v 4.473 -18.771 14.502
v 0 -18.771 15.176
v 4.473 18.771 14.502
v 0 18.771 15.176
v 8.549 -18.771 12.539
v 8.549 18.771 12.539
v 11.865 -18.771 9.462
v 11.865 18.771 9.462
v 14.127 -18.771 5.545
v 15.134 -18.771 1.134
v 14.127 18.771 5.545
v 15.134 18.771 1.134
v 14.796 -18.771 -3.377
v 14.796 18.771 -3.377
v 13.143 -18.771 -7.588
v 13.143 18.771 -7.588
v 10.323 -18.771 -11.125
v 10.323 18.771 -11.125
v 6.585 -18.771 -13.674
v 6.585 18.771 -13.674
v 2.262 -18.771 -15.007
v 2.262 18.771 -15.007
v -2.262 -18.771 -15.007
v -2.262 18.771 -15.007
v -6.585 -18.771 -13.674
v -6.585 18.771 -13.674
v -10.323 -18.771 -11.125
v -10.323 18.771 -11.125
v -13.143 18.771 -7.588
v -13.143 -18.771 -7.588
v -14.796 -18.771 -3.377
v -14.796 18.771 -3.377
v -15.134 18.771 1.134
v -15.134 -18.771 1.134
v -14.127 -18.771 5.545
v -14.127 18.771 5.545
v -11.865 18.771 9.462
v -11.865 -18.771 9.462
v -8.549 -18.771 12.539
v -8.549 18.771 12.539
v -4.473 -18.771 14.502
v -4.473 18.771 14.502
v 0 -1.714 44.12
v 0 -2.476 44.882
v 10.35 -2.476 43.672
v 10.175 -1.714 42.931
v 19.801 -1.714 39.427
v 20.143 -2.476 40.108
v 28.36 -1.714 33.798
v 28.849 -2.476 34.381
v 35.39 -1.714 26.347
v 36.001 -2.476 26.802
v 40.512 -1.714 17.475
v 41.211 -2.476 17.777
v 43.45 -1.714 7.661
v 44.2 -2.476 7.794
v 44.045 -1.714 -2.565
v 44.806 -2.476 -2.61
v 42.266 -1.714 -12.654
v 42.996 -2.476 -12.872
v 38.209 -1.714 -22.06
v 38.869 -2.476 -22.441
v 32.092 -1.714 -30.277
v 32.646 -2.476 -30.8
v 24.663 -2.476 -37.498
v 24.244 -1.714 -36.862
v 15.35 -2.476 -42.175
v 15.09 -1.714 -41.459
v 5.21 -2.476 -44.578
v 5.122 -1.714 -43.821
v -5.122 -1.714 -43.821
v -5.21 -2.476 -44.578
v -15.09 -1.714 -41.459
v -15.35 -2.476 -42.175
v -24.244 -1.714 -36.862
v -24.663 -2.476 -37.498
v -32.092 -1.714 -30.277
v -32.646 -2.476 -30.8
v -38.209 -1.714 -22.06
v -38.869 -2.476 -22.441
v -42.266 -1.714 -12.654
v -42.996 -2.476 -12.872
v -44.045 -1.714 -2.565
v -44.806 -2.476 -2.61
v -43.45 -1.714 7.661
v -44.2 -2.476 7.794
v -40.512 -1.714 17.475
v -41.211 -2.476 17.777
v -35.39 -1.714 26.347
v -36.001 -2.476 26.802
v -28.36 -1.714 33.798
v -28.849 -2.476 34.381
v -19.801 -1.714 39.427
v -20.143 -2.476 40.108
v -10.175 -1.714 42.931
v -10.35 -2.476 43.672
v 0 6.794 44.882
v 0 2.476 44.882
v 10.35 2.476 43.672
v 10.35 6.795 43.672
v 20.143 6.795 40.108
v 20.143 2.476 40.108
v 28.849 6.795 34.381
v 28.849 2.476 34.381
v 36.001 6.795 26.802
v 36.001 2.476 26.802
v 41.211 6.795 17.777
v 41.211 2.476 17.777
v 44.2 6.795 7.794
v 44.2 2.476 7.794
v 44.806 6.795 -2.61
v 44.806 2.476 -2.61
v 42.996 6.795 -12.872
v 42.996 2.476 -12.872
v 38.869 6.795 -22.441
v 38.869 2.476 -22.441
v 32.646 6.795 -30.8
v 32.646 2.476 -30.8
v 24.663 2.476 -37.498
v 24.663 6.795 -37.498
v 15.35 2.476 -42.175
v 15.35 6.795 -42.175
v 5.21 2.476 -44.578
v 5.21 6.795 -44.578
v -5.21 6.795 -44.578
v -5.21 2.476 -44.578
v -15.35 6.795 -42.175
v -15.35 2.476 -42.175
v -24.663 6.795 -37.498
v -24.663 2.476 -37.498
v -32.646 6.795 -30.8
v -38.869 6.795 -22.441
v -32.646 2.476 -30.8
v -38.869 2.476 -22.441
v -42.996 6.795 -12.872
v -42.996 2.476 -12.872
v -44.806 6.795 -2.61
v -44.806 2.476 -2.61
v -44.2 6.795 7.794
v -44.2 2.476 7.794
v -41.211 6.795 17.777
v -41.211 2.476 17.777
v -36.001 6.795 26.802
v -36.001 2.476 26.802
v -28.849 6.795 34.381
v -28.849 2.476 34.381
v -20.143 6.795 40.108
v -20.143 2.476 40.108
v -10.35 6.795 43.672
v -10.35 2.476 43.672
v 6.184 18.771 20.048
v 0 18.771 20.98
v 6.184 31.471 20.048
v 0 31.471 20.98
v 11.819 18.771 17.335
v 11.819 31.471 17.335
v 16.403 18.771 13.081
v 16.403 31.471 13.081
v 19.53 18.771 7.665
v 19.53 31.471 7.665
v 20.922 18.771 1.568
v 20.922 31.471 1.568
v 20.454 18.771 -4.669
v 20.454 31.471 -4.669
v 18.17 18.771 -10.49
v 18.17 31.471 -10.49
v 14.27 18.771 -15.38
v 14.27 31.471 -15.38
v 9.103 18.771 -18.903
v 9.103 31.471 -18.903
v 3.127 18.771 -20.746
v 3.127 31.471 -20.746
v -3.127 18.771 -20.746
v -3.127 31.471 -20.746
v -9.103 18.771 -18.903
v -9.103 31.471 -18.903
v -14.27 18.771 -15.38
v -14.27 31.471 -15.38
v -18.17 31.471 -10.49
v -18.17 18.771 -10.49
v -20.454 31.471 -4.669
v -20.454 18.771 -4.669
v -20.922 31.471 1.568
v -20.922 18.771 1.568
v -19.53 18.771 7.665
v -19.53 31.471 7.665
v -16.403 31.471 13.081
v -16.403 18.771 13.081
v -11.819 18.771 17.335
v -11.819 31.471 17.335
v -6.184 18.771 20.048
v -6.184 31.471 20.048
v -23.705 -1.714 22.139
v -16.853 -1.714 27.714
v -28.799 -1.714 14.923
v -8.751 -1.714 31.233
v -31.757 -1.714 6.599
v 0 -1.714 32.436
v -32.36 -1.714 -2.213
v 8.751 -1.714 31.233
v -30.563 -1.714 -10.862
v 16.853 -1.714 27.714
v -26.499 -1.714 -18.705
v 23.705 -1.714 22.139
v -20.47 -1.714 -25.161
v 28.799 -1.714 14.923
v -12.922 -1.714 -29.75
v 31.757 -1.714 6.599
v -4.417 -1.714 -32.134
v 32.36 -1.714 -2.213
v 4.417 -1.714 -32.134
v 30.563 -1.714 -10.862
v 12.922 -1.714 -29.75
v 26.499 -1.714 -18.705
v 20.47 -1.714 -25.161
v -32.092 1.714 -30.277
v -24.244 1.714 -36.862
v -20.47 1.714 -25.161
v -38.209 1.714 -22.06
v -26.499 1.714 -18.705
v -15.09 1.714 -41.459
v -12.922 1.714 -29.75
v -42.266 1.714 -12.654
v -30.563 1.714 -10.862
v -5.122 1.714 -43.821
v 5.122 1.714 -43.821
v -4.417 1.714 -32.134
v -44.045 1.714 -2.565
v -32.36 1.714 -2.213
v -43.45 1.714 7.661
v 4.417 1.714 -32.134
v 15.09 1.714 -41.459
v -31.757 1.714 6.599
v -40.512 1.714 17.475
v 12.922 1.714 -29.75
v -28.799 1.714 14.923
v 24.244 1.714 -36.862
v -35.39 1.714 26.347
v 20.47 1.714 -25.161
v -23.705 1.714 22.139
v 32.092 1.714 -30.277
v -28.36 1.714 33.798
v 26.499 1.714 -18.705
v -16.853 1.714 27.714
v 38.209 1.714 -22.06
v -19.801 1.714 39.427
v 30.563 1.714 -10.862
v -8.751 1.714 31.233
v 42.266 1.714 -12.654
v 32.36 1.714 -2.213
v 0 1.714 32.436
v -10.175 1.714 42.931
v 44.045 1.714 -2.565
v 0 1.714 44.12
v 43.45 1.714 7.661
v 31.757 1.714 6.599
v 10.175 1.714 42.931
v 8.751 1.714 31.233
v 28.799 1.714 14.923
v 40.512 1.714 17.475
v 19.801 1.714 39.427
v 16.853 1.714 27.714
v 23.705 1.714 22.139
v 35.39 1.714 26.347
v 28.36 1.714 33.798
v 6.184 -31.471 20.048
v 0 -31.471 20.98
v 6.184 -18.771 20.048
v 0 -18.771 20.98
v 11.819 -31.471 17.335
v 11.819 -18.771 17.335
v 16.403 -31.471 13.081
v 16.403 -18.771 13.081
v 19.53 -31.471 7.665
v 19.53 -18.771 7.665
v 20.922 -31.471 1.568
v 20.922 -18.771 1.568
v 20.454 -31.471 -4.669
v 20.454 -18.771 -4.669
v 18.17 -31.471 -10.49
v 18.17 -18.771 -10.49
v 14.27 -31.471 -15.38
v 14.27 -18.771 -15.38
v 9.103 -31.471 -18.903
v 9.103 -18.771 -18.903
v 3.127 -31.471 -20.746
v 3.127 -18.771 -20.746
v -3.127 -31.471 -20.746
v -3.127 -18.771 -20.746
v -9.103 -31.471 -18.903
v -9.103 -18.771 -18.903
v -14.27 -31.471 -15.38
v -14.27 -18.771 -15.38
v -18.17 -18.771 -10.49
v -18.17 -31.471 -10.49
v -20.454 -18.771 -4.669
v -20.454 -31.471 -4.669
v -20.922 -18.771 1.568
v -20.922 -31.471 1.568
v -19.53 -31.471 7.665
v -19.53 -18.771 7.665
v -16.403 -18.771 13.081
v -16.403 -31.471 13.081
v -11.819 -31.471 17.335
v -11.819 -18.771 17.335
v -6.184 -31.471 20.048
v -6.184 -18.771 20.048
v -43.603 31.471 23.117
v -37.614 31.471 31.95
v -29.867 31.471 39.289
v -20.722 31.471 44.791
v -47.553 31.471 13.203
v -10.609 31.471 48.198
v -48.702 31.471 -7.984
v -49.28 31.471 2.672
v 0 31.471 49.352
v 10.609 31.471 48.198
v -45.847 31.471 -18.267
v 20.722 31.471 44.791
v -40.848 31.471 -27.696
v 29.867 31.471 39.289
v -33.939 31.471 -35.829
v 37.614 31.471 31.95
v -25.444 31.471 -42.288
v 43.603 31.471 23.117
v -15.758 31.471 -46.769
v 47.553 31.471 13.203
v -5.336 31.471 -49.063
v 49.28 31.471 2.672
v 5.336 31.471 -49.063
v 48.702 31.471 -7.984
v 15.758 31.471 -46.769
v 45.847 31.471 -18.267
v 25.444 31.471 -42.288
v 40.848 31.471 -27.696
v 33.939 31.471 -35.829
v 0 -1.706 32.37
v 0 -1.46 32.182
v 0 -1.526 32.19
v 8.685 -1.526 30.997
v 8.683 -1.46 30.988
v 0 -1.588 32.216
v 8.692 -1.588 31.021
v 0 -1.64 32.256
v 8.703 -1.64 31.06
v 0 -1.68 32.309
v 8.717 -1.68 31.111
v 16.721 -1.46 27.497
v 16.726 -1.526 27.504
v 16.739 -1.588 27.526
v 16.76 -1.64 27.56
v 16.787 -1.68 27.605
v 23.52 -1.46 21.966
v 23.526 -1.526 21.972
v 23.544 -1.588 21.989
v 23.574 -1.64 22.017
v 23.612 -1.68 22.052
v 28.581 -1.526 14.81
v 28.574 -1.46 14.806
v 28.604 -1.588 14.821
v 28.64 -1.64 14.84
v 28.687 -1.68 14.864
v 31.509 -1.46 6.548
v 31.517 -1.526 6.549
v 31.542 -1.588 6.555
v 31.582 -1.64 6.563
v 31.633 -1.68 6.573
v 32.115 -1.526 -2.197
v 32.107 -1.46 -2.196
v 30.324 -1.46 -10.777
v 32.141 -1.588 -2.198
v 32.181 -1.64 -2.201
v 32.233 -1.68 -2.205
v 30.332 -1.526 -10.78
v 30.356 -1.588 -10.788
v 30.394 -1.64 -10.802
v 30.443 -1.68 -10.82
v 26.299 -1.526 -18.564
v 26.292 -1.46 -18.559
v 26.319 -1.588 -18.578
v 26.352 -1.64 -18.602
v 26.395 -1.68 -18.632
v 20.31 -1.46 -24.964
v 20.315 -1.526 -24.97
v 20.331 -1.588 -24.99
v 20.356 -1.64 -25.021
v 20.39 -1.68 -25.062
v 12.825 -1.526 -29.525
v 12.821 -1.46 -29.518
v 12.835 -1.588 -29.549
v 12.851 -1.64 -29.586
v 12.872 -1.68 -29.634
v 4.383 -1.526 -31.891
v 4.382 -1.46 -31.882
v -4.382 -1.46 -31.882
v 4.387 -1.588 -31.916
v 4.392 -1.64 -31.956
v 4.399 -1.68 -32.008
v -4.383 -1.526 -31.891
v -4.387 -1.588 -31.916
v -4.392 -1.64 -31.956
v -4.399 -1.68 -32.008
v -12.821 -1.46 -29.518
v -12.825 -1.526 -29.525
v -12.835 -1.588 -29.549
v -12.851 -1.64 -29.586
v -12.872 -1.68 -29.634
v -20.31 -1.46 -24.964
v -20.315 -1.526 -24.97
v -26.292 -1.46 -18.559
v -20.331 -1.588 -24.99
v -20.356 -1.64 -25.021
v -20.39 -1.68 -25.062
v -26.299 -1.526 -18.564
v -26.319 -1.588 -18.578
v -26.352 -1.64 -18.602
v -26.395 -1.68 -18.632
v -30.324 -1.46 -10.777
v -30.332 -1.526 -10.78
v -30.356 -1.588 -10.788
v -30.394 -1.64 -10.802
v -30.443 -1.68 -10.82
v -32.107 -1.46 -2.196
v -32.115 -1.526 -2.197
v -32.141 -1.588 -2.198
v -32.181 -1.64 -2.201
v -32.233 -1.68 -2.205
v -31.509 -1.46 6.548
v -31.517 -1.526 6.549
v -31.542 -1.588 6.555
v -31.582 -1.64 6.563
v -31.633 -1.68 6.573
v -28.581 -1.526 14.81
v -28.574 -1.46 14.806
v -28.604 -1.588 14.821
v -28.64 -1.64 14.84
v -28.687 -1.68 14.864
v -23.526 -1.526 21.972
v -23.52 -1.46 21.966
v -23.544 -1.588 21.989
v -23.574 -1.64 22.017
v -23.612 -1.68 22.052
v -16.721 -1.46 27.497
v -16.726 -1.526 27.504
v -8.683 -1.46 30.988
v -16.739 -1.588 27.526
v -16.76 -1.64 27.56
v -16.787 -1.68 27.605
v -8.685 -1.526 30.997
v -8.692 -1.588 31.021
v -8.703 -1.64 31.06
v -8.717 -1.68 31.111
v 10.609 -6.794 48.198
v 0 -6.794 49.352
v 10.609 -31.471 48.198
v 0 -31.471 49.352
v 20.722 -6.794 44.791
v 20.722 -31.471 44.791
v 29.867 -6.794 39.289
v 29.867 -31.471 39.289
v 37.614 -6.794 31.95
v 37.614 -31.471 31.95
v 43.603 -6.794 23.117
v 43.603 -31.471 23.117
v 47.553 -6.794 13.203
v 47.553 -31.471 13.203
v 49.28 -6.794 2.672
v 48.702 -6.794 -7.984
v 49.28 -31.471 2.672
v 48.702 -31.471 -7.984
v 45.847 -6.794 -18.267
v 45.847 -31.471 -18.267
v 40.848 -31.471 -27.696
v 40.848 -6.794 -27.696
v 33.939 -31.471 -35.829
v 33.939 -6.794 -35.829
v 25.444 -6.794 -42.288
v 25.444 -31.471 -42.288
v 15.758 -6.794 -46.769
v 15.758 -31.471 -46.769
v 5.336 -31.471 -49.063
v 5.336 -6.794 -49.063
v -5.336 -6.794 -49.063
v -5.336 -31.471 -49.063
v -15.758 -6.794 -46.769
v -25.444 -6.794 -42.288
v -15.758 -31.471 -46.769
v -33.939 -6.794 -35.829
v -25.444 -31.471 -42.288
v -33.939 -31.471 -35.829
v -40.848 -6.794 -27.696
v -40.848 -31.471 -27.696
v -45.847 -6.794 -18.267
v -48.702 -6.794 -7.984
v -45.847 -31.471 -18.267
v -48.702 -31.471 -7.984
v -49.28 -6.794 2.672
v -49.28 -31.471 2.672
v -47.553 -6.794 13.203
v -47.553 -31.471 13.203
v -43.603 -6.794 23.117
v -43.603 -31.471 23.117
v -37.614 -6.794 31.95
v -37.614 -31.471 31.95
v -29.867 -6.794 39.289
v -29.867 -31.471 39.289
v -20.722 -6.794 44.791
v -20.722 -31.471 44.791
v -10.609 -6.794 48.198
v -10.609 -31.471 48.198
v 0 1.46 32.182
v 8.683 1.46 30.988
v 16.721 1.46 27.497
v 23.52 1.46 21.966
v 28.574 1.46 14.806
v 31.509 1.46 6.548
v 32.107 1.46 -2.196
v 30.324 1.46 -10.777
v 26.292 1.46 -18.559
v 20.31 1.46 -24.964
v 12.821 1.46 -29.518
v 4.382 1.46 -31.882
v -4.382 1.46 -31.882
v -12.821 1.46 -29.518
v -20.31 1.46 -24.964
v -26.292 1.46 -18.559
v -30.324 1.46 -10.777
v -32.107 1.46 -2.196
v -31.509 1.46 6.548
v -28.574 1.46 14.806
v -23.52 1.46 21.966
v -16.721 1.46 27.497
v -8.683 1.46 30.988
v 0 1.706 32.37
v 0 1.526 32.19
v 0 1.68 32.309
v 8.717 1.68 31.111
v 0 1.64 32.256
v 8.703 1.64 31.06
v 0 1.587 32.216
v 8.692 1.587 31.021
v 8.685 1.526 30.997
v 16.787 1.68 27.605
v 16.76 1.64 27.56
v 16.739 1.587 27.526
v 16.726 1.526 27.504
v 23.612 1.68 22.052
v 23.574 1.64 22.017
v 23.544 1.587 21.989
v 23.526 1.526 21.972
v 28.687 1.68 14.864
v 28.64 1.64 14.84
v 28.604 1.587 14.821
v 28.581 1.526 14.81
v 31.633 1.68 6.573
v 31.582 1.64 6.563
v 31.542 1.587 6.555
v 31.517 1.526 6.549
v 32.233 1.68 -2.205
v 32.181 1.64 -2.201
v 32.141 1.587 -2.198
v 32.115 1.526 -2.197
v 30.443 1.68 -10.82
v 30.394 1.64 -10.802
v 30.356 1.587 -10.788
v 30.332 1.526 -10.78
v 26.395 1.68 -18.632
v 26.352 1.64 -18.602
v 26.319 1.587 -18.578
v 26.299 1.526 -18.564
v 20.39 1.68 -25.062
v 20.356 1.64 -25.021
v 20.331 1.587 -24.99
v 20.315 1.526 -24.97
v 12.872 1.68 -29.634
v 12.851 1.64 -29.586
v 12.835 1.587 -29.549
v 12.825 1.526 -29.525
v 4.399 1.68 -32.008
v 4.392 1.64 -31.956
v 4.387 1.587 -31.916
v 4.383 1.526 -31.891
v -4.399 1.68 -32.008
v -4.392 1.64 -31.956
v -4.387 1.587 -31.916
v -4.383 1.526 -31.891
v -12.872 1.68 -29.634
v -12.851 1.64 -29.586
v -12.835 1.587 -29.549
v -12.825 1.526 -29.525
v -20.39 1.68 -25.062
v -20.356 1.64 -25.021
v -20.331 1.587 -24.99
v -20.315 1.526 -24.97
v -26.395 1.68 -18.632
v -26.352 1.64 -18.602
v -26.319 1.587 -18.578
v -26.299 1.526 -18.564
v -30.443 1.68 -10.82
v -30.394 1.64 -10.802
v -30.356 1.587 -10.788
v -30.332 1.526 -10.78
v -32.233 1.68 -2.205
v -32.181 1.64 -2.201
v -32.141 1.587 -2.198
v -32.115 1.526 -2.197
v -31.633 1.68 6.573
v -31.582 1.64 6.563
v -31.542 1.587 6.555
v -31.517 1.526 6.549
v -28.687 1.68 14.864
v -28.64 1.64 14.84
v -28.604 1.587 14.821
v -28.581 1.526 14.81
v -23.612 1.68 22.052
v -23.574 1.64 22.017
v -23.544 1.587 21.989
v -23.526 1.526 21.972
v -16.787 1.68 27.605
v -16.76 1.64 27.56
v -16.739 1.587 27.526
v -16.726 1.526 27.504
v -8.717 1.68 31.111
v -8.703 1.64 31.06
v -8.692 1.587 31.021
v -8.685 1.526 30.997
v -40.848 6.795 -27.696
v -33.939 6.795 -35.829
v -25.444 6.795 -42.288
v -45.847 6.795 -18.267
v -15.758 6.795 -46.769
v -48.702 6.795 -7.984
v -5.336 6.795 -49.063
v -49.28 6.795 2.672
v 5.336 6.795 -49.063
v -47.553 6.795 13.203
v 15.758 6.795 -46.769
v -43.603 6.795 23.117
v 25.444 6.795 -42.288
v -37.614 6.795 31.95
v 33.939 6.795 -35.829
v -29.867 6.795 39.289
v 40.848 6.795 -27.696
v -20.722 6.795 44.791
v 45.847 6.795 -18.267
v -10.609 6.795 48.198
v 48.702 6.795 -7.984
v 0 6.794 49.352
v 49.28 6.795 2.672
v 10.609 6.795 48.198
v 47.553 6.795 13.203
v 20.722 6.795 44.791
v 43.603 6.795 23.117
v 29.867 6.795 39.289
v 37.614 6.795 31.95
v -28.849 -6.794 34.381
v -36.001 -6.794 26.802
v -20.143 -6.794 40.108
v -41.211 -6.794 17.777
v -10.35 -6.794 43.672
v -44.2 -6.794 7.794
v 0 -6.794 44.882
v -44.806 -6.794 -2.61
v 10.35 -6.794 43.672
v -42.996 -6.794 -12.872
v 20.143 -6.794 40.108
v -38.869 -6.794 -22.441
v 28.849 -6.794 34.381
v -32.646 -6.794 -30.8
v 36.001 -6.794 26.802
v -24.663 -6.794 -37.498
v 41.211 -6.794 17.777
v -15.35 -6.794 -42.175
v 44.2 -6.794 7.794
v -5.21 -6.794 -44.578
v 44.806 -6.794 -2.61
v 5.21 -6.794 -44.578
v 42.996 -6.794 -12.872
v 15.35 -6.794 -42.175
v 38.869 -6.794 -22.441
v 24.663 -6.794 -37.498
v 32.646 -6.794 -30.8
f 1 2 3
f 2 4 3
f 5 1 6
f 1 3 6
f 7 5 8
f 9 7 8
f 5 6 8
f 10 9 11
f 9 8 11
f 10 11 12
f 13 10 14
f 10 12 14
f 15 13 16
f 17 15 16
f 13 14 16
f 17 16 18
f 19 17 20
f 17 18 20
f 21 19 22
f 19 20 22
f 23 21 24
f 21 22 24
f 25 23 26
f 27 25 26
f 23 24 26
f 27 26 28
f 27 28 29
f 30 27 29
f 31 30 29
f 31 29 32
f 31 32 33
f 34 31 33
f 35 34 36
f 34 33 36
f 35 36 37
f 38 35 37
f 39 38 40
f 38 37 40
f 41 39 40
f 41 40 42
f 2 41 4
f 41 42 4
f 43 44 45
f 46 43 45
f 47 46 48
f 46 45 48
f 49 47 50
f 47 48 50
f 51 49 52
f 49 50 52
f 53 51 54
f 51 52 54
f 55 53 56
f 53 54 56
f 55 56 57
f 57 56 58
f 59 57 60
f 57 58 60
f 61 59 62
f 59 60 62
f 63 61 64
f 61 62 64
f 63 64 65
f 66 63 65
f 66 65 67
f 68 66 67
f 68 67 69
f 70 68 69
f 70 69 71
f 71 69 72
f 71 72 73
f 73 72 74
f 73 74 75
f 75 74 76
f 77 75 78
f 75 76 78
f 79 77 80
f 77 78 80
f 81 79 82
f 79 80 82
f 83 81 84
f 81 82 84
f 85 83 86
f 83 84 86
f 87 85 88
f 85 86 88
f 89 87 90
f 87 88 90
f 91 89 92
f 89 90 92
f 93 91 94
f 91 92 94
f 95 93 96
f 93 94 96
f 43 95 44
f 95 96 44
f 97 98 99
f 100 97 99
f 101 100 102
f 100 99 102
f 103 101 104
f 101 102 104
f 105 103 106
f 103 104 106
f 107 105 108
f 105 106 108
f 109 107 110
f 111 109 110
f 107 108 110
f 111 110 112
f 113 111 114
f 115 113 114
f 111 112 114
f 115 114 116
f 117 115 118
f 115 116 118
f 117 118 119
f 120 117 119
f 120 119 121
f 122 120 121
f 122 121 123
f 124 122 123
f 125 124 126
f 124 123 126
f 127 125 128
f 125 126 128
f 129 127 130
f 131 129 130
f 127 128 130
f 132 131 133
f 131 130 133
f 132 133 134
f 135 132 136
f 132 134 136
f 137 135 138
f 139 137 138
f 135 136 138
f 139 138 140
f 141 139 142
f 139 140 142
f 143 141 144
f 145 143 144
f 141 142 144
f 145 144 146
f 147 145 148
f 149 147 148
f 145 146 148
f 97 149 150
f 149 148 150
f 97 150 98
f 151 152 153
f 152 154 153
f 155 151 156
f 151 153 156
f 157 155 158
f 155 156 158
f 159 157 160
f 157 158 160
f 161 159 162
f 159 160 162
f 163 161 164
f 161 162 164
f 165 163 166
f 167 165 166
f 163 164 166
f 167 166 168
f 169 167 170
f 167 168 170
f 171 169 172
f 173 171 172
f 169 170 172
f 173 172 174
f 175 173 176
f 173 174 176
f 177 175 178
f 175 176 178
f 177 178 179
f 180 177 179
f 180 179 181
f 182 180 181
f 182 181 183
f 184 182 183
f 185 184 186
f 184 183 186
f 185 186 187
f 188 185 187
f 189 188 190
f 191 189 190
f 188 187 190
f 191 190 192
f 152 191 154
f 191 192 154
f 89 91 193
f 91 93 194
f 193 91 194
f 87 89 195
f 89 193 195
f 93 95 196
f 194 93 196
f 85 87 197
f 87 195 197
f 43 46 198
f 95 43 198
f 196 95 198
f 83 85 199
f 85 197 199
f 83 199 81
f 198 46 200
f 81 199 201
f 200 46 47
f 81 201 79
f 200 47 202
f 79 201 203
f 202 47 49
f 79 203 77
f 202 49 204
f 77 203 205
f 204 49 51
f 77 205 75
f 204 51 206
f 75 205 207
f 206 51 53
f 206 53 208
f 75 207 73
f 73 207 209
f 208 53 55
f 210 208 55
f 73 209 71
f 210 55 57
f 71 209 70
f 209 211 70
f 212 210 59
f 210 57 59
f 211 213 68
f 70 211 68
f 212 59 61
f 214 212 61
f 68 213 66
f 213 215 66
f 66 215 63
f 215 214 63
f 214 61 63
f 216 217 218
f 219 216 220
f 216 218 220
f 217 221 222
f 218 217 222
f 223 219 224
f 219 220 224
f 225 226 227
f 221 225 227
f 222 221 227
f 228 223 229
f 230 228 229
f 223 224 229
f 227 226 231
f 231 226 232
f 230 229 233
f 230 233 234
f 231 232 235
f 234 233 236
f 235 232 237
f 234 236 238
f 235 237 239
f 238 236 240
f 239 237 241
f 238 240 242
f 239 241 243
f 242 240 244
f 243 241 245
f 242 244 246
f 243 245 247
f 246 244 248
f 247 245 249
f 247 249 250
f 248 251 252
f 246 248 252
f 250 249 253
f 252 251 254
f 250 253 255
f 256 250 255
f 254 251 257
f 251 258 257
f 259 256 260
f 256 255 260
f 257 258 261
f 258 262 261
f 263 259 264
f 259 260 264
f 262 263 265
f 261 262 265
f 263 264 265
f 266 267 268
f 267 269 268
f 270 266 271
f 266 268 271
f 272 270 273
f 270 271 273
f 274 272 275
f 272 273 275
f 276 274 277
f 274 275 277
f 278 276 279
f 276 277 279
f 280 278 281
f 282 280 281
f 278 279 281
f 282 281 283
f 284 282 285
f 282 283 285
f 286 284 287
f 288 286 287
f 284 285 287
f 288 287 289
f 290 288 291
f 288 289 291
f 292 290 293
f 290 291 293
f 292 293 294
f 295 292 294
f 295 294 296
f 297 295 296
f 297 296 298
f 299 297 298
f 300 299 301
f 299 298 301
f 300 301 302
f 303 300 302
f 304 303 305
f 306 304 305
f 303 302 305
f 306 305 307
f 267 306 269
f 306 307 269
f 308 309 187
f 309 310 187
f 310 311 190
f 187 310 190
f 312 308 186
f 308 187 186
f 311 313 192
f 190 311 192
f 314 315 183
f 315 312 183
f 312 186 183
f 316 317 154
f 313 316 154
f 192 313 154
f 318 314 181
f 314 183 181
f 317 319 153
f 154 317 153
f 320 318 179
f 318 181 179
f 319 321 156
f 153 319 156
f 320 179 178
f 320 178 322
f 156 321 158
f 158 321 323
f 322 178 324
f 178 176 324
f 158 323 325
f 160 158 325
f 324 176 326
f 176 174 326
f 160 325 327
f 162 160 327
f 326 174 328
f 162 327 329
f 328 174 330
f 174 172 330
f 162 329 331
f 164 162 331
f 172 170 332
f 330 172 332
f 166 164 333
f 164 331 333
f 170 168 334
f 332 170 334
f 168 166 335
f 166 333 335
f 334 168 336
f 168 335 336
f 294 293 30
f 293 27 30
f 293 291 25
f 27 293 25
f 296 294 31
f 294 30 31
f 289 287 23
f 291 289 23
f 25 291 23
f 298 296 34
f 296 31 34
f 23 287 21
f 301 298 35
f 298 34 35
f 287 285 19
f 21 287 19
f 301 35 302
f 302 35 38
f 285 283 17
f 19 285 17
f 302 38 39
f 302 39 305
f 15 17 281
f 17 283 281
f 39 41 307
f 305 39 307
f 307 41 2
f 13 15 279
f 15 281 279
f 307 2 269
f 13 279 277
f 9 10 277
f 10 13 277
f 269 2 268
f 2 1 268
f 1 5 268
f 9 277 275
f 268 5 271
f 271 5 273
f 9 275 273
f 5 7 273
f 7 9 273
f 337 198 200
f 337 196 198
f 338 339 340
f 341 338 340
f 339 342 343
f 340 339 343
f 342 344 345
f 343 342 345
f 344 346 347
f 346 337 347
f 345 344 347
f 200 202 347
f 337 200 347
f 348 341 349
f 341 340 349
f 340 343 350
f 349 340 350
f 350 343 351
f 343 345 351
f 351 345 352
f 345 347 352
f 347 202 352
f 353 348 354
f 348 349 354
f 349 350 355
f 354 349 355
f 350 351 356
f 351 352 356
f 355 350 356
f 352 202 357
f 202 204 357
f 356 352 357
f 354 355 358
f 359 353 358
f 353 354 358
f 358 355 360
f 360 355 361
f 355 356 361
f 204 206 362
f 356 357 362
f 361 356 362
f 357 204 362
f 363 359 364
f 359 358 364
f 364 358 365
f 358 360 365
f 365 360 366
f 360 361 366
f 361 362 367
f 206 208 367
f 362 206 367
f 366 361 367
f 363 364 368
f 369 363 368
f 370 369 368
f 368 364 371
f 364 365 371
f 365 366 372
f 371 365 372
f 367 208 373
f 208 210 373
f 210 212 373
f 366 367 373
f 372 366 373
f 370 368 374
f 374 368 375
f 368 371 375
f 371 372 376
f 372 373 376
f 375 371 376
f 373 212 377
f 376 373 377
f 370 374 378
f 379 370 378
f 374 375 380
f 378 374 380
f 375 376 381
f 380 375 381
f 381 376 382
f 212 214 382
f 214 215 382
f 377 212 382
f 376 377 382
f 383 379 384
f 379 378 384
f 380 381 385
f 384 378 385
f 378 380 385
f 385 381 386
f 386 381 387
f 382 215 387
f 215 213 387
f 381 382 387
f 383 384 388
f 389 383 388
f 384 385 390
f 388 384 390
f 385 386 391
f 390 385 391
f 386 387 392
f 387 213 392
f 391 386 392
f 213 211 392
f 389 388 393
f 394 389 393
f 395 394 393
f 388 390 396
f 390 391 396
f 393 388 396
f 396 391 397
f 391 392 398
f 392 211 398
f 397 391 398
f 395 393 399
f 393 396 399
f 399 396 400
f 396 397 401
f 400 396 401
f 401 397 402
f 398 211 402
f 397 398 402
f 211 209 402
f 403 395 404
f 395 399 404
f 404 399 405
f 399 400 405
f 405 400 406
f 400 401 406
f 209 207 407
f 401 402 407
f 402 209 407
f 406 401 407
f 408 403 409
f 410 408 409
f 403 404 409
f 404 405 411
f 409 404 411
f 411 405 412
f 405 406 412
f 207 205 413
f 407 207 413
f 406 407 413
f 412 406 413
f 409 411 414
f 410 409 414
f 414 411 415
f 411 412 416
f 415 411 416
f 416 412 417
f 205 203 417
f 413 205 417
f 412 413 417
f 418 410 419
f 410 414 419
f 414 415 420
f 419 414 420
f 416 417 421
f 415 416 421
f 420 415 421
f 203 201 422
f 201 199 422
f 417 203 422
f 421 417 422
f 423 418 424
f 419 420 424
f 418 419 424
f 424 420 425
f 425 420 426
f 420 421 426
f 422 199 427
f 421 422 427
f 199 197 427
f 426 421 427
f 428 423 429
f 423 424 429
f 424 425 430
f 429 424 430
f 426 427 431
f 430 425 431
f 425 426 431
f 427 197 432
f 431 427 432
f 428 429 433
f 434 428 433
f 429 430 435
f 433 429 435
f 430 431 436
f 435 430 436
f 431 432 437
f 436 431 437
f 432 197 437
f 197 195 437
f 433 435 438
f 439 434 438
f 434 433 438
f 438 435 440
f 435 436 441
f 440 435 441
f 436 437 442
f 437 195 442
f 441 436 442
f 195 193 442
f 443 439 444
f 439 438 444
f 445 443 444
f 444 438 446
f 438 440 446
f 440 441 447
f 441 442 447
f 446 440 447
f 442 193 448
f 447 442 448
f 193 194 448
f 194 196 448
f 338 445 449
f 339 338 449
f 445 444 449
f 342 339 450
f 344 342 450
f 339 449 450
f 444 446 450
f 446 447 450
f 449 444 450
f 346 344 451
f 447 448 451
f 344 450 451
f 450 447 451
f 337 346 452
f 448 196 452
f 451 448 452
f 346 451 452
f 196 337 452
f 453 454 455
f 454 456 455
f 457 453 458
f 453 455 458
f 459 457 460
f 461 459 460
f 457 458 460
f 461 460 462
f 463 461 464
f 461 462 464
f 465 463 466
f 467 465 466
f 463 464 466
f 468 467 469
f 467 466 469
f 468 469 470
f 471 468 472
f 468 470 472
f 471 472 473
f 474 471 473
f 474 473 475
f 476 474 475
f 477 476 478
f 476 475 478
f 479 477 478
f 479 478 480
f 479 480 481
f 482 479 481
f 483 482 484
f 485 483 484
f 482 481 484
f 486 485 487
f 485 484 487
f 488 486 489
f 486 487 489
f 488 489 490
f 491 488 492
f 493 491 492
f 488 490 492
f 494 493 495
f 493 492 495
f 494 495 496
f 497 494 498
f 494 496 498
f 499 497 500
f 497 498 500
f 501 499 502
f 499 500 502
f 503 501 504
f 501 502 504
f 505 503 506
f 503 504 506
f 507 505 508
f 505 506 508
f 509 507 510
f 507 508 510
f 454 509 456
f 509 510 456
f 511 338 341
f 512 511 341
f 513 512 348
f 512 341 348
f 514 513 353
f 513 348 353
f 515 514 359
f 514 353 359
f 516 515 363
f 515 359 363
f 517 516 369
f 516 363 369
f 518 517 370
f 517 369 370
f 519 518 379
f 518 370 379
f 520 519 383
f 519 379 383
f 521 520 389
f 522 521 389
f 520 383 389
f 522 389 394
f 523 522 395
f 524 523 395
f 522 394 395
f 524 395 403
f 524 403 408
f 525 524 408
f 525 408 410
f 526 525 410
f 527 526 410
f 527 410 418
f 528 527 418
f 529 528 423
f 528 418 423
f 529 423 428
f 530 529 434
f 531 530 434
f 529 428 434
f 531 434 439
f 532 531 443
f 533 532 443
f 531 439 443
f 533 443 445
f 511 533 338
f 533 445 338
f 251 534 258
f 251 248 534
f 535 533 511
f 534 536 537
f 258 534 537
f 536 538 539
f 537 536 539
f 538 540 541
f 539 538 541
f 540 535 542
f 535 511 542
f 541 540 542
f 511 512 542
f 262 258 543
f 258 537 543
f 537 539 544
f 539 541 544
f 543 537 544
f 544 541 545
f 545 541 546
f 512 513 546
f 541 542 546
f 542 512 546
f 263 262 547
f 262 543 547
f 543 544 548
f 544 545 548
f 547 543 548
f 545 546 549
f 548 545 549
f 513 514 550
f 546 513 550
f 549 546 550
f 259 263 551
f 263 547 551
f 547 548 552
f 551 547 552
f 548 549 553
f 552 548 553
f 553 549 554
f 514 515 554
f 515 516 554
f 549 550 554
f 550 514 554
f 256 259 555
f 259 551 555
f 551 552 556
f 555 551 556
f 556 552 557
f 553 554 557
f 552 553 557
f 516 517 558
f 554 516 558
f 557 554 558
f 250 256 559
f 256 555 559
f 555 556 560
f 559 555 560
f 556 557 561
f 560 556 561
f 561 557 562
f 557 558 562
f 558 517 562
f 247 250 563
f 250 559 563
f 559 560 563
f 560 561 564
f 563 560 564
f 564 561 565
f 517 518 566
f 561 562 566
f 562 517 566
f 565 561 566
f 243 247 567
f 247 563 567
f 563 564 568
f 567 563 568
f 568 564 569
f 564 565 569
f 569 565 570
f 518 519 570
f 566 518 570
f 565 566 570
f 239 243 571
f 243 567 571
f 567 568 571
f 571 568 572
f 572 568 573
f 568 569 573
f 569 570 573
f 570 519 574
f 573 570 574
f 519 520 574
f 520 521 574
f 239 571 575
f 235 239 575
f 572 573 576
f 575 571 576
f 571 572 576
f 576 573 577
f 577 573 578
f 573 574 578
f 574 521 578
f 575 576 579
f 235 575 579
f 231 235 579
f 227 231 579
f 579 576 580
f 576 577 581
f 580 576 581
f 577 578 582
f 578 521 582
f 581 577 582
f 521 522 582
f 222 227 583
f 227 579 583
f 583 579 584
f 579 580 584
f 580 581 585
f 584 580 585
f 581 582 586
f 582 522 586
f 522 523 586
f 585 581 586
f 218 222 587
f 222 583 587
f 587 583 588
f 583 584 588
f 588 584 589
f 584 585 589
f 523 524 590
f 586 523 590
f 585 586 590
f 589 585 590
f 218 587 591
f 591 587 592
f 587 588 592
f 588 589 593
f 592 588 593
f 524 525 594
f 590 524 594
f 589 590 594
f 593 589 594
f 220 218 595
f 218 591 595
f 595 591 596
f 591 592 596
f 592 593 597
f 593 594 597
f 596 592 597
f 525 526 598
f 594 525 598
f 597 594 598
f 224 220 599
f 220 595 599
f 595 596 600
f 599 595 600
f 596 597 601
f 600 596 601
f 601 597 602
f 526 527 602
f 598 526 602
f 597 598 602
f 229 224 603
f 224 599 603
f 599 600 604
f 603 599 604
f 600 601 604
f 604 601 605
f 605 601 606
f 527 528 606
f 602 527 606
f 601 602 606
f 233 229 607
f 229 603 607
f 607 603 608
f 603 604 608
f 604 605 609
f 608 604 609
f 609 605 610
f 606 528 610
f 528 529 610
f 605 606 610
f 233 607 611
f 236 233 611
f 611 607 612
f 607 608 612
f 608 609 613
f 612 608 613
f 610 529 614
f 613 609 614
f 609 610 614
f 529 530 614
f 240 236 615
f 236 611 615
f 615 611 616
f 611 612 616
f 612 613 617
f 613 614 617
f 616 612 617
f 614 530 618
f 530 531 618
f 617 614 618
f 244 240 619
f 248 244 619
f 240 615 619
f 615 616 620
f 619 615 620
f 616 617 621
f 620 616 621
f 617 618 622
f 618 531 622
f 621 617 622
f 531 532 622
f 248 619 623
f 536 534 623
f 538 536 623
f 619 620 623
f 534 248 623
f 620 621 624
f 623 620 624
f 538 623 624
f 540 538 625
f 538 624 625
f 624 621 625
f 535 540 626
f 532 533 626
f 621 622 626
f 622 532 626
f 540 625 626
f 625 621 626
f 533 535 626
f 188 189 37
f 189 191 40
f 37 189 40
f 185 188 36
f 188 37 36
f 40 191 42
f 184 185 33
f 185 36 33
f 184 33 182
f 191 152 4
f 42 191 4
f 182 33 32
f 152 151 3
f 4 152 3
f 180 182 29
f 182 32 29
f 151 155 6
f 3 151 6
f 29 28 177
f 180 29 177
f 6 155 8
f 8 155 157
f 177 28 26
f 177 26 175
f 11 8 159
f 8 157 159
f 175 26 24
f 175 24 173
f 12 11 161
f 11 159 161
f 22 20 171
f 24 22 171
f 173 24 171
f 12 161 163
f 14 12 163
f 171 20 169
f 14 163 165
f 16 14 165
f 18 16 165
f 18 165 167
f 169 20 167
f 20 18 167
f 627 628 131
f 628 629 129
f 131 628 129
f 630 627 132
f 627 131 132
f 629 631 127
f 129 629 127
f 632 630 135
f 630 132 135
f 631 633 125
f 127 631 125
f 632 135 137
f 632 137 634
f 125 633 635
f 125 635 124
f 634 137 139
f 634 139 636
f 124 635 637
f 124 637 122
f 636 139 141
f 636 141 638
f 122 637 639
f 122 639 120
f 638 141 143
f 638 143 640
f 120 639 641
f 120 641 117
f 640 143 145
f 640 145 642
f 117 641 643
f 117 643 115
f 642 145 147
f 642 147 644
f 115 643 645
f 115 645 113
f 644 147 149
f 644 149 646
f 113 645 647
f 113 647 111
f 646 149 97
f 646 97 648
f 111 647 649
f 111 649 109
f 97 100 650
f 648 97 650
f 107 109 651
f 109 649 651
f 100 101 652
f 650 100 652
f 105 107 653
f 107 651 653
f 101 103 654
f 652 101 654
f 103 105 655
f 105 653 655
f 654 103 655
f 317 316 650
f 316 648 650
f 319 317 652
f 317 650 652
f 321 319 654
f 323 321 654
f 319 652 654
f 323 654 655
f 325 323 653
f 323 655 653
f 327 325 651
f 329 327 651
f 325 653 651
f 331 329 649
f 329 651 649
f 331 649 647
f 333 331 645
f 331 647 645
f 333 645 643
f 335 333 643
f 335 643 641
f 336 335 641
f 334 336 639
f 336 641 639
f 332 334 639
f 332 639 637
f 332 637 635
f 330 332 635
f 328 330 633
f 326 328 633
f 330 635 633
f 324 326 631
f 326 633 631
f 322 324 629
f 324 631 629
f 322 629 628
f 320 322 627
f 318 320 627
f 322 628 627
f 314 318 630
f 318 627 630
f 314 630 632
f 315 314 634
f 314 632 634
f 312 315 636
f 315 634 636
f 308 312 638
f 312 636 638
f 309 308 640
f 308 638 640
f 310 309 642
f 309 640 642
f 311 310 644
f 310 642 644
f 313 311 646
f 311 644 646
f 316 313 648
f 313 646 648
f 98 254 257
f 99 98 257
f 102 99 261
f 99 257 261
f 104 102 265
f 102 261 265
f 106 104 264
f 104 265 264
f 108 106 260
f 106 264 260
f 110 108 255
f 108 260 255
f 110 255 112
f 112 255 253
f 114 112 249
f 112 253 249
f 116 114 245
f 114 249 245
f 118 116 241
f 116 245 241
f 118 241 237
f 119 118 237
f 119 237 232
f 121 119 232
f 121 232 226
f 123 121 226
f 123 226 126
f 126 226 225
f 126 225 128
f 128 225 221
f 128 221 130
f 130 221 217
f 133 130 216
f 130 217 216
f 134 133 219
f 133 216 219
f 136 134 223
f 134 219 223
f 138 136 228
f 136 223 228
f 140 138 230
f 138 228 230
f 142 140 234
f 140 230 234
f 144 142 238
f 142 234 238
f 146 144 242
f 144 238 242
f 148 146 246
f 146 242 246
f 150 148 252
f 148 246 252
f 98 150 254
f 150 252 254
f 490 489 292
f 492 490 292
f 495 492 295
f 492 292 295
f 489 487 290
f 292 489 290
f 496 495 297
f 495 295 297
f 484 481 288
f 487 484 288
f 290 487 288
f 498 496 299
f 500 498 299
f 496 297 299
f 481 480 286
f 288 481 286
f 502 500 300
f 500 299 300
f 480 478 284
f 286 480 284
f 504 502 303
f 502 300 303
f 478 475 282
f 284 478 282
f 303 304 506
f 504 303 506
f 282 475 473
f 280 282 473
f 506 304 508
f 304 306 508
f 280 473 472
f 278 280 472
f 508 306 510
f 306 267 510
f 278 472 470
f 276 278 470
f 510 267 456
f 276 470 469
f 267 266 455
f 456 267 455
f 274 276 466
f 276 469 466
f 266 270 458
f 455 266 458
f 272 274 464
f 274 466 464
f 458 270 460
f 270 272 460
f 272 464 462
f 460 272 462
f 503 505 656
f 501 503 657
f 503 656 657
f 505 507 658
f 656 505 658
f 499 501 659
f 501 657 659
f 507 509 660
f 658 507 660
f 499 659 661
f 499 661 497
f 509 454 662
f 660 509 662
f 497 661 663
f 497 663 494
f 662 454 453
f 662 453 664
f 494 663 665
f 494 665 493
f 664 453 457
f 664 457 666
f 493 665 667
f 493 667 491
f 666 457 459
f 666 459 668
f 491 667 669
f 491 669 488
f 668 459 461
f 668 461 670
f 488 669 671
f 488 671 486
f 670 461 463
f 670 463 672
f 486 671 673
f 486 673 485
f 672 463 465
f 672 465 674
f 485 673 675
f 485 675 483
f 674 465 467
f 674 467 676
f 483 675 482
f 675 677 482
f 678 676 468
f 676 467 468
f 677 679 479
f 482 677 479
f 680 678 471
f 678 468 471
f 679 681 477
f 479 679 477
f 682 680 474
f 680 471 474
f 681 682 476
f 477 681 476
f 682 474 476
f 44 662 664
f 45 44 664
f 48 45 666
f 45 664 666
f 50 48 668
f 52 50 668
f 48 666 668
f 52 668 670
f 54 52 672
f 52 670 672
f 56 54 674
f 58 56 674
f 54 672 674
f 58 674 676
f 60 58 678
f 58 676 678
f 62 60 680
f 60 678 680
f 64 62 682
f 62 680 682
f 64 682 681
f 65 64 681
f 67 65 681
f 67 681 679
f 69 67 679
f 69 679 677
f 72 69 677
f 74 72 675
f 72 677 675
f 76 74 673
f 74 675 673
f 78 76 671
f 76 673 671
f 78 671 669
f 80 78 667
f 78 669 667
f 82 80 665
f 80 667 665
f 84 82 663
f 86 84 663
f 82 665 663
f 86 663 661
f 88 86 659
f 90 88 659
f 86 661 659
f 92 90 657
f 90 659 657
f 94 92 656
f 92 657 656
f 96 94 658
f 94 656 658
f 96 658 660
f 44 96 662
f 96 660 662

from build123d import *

# Parameters (mm, degrees)
F2_SIZE = 0.762
F3_R    = 0.254


with BuildPart() as f1:
    # F0 (on Right) → F1 (revolve)
    with BuildSketch(Plane.YZ):
        Polygon((-18.7706, 15.1765), (0, 15.1765), (18.7706, 15.1765), (18.7706, 20.9804), (31.4706, 20.9804), (31.4706, 49.3522), (6.7945, 49.3522), (6.7945, 44.8818), (1.7145, 44.8818), (1.7145, 32.1818), (-1.7145, 32.1818), (-1.7145, 44.8818), (-6.7945, 44.8818), (-6.7945, 49.3522), (-31.4706, 49.3522), (-31.4706, 20.9804), (-18.7706, 20.9804), align=None)
    revolve(axis=Axis((0, -0.984378, 0), (0, 1, 0)))

    # F2
    f2_edges = [f1.edges().sort_by_distance(p)[0] for p in [
        (0, 1.7145, -44.8818),
        (0, -1.7145, -44.8818),
    ]]
    chamfer(f2_edges, length=F2_SIZE)

    # F3
    f3_edges = [f1.edges().sort_by_distance(p)[0] for p in [
        (0, -1.7145, -32.1818),
        (0, 1.7145, -32.1818),
    ]]
    fillet(f3_edges, radius=F3_R)


solid = f1.part
